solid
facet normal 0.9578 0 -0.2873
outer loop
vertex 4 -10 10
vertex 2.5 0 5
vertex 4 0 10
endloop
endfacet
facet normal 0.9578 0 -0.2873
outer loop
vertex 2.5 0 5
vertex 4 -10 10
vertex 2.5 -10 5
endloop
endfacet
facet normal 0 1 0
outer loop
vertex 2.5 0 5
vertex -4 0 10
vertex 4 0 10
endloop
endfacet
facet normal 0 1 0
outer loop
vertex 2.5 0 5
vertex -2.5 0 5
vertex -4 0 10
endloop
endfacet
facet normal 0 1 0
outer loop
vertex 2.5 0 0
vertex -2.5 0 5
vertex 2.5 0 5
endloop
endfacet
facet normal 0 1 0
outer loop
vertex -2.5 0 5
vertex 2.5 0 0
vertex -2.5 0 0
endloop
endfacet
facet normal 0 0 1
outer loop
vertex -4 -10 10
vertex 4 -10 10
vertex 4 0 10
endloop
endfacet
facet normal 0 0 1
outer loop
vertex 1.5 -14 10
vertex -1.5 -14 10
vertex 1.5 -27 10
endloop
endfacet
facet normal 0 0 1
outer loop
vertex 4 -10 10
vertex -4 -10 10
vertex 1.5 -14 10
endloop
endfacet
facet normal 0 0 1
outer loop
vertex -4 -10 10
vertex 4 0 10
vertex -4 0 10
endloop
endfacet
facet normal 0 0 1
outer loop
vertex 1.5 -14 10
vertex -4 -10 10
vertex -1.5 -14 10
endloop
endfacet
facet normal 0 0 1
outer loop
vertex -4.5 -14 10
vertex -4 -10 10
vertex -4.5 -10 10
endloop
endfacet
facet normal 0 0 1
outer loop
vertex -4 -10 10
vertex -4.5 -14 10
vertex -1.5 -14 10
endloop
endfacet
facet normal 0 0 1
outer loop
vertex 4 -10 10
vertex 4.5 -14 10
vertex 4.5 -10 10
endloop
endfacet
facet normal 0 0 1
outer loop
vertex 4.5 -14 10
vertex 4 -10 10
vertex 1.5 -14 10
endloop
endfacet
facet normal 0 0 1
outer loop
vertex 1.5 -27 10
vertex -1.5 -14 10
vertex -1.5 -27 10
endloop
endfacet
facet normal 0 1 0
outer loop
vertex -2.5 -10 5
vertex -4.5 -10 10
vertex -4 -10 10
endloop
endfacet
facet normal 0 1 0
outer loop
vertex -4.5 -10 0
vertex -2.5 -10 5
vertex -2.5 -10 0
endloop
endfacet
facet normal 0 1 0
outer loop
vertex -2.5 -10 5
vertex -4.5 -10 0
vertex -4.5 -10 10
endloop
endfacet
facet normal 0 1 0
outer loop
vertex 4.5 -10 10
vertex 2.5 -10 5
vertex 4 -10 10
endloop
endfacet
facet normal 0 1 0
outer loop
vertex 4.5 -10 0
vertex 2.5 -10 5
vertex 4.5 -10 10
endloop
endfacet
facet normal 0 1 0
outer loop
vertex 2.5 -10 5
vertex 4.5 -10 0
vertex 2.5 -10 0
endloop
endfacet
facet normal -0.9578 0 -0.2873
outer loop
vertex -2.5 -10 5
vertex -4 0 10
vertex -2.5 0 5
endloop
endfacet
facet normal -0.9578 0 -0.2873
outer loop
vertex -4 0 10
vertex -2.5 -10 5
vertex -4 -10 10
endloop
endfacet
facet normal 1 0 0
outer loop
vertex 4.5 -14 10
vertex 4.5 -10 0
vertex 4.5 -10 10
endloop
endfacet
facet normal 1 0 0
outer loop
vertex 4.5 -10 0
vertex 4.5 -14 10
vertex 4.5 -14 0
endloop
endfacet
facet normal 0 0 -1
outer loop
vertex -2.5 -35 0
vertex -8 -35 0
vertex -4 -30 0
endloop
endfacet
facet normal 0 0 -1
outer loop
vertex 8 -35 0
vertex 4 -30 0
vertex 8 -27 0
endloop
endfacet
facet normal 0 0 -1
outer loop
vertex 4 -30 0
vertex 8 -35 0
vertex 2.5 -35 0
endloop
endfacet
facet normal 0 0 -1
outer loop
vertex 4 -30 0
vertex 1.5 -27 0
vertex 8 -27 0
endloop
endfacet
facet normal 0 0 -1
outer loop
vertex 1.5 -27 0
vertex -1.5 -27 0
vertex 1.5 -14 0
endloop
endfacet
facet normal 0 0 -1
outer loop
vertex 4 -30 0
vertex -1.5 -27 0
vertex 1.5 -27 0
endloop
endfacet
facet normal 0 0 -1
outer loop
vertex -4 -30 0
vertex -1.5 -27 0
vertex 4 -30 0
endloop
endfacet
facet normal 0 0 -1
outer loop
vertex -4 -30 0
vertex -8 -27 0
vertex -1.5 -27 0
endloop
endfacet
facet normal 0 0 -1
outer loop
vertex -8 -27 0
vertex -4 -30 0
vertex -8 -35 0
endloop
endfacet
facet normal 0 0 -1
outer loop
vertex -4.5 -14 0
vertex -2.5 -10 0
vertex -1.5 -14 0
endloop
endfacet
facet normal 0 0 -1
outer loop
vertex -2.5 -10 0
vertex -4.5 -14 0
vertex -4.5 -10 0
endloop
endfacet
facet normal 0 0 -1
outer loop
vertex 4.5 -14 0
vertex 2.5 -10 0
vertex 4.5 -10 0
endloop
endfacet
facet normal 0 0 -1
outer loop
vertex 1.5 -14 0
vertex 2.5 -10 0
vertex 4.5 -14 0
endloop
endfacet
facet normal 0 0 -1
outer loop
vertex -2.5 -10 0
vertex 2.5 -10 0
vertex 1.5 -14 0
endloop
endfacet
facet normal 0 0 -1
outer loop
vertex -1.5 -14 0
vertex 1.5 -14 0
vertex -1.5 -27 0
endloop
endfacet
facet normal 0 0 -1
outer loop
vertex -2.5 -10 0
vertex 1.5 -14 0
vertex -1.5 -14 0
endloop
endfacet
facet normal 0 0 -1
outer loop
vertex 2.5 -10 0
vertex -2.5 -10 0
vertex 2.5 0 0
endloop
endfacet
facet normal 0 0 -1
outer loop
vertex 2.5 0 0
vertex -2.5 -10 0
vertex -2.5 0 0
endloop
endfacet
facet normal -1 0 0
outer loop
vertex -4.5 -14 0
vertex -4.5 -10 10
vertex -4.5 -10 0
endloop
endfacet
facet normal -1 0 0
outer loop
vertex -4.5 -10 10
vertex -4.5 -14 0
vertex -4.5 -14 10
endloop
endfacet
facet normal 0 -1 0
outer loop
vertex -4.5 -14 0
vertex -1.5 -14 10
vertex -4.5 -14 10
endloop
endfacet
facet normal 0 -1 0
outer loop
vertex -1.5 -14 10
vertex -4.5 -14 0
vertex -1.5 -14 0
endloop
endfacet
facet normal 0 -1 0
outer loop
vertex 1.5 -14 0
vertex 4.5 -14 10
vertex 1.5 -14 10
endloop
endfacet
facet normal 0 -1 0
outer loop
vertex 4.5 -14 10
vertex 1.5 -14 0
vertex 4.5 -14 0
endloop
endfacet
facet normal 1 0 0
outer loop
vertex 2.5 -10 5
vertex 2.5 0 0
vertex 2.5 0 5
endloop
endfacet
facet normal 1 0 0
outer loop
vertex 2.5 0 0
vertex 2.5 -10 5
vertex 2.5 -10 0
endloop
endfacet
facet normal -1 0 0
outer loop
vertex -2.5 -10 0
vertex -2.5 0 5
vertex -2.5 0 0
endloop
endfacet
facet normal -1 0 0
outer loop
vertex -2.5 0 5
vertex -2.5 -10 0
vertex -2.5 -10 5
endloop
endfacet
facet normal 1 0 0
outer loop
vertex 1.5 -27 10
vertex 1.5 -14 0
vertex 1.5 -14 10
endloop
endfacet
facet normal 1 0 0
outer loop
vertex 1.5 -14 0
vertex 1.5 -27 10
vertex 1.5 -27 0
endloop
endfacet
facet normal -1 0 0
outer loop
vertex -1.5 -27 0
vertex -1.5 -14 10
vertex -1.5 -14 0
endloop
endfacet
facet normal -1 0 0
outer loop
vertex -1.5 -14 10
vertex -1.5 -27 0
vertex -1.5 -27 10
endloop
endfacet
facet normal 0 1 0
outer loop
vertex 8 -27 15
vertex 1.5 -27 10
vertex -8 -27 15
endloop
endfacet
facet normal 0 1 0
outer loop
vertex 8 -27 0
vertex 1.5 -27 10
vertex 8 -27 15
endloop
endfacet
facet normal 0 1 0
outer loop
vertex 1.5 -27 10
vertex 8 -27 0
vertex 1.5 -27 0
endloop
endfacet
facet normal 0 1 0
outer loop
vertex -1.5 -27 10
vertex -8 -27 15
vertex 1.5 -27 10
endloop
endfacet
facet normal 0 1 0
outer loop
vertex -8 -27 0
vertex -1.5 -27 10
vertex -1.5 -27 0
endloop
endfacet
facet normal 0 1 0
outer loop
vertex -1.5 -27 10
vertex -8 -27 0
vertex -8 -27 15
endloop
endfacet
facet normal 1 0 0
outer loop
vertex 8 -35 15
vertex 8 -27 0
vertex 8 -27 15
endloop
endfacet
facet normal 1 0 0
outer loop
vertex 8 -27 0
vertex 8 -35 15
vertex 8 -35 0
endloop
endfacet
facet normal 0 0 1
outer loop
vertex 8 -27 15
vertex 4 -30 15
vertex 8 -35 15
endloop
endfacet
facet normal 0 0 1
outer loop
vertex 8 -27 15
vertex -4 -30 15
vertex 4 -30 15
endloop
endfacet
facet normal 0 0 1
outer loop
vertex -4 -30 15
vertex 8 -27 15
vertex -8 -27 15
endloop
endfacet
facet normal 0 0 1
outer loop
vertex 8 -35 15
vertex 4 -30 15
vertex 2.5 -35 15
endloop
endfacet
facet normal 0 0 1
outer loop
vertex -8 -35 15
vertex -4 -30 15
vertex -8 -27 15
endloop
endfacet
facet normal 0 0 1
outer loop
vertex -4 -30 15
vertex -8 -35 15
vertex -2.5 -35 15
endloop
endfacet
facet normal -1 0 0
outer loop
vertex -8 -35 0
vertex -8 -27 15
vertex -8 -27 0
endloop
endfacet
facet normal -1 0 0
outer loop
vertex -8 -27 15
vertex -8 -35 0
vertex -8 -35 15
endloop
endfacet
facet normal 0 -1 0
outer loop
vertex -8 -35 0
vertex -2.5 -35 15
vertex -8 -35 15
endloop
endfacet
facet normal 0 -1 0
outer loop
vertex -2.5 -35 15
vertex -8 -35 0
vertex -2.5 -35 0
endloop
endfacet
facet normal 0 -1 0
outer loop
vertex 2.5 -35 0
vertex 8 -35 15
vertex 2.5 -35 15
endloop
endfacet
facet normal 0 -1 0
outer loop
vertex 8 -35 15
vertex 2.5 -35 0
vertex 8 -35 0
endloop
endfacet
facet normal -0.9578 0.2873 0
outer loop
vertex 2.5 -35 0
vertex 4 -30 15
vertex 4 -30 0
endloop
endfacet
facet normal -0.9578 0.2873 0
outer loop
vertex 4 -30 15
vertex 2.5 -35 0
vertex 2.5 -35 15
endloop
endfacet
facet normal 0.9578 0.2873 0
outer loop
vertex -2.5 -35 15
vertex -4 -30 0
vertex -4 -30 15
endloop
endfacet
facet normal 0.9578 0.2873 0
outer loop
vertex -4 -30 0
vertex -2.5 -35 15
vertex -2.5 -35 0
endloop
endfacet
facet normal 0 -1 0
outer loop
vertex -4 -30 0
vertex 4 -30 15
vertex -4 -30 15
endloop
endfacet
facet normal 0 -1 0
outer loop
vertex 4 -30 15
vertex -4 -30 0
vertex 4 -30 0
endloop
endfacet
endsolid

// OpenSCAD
// file: include.scad
//////////////////      END SECTION       //////////////////

	module added_pins(){
		difference(){
			union(){
				translate([30/(15/4),obj_leg*leg_length,30/(15/4)]) pin();
				translate([30/(15/4)+14.5,obj_leg*leg_length,30/(15/4)+14]) pin();
			}
			union(){
							translate([30/(15/4)+13.5,obj_leg*leg_length-20,30/(15/4)+5])cube(size=[2,40,15]);
							translate([30/(15/4)+7.5,obj_leg*leg_length-20,30/(15/4)+15])rotate([0,90,0]) cube(size=[2,40,15]);	

							translate([30/(15/4)-1,obj_leg*leg_length-20,30/(15/4)-8])cube(size=[2,40,15]);
							translate([30/(15/4)-10,obj_leg*leg_length-20,30/(15/4)+1])rotate([0,90,0]) cube(size=[2,40,15]);
			}
		}
	}
	module taken_pins() {
		translate([30/(15/4)+14,obj_leg*leg_length-10,30/(15/4)]) mirror_pin();
		translate([30/(15/4),obj_leg*leg_length-10,30/(15/4)+15]) mirror_pin();
	}


//////////////////      OTHER STUFF       //////////////////

	module holes() {
		rotate([0,0,90]) for(y=[0:other_holes])
		translate([obj_leg+y*15,-15.5,7.5]) union() {
			translate([7.5,0,15]) hole_up();
			hole_down();
		}
	}
	module extend_holes() {
	module top(){
		rotate([0,0,90]) for(y=[0:other_holes+1])
		translate([(30/4)+y*15,-15.5,7.5]) union() {
			translate([7.5,0,15]) hole_up();
		}
	}
	module bottom(){
		rotate([0,0,90]) for(y=[0:other_holes+2])
		translate([(30/4)+y*15,-15.5,7.5]) union() {
			hole_down();
		
}
	}
	union(){
		top();
		bottom();
	}
	}

	module hole() {
		union() {
			rotate([90, 90, 0]) cylinder(h=40, d=hole_pin_diameter, center=true);
			translate([0,7.5,0]) sphere(d=hole_ball_size);
			translate([0,-6,0]) sphere(d=hole_ball_size);
		}
	}
	module hole_up() {
		union() {
			rotate([90, 90, 0]) cylinder(h=40, d=hole_pin_diameter, center=true);
			translate([0,7.5,10]) cylinder(h=hole_pin_height, d=hole_pin_diameter, center=true);
			translate([0,-6,10]) cylinder(h=hole_pin_height, d=hole_pin_diameter, center=true);
			translate([0,7.5,0]) sphere(d=hole_ball_size);
			translate([0,-6,0]) sphere(d=hole_ball_size);
		}
	}
	module hole_down() {
		union() {
			rotate([90, 90, 0]) cylinder(h=40, d=hole_pin_diameter, center=true);
			translate([0,7.5,-10]) cylinder(h=hole_pin_height, d=hole_pin_diameter, center=true);
			translate([0,-6,-10]) cylinder(h=hole_pin_height, d=hole_pin_diameter, center=true);
			translate([0,7.5,0]) sphere(d=hole_ball_size);
			translate([0,-6,0]) sphere(d=hole_ball_size);
		}
	}
	module pin() {
		union() {
			rotate([90, 90, 0]) cylinder(h=pin_height, d=pin_diameter, center=true);
			translate([0,7.5,0]) sphere(d=ball_size);
		}
	}

	module mirror_pin() {
		rotate([90, 90, 0]) cylinder(h=hole_pin_height+small_number, d=hole_pin_diameter, center=true);
		translate([0,-(pin_height-(ball_size/2)),0]) sphere(d=ball_size);
	}


//////////////////      SOME RACK AND Z THINGS       //////////////////

module z_holes() {
    rotate([0,-90,0]) for(z=[0:z_hole_number])
    translate([22.5+z*15,16,-12])
        hole();
}

module pin_cuts() {
	union(){
		cube(size=[2,10,40], center=true);
		rotate([0,0,90]) cube(size=[2,10,40], center=true);
	}
}
module pin_uncut() {
	union(){
		rotate([0, 0, 90]) cylinder(h=hole_pin_height, d=hole_pin_diameter, center=true);
		translate([0,0,10]) sphere(d=ball_hole);
	}
}


module pin_out() {
	union(){
		rotate([0, 0, 90]) cylinder(h=pin_height, d=pin_diameter, center=true);
		translate([0,0,10]) sphere(d= ball_size);
	}
}


module pins_z(){
	difference() {
		pin_out();
		pin_cuts();
	}
}
//////////////////      RACK AND SLIDE     ///////////////////

module straight_pins() {
	for(z=[0:((((obj_leg*leg_length)*2)-(obj_leg*2))/3)/14.5]) rotate([-90,0,0]) translate([z*15,30/(15/4),14]) pins_z();
	for(z=[0:((((obj_leg*leg_length)*2)-(obj_leg*2))/3)/14.5]) rotate([-90,0,0]) translate([z*15,30/(15/4)-14,14]) pins_z();
}
module stagger_pins() {
	for(z=[0:((((obj_leg*leg_length)*2)-(obj_leg*2))/3)/14.5]) rotate([-90,0,0]) translate([z*15,30/(15/4),14]) pins_z();
	for(z=[0:((((obj_leg*leg_length)*2)-(obj_leg*2))/3)/14.5]) rotate([-90,0,0]) translate([z*15+7,30/(15/4)-14,14]) pins_z();
}


//////////////////      DOVE TAIL       //////////////////

module male_dovetail(height) {
	dovetail_3d(max_width,min_width,depth,height);
}

module dovetail_3d(max_width=11, min_width=5, depth=5, height=30) {
	linear_extrude(height=height, convexity=2)
		dovetail_2d(max_width,min_width,depth);
}

module dovetail_2d(max_width=11, min_width=5, depth=5) {
	angle=atan((max_width/2-min_width/2)/depth);
	echo("angle: ", angle);
	polygon(paths=[[0,1,2,3,0]], points=[[-min_width/2,0], [-max_width/2,depth], [max_width/2, depth], [min_width/2,0]]);
}

//bow tie
	module tie_end(height){
				rotate([0,0,0]) translate([0,-0.01,((obj_leg/2)/2)]) male_dovetail(height);
				rotate([0,90,0]) translate([0,-0.01,((obj_leg/2)/2)]) male_dovetail(height);
				rotate([0,180,0]) translate([0,-0.01,((obj_leg/2)/2)]) male_dovetail(height);
				rotate([0,-90,0]) translate([0,-0.01,((obj_leg/2)/2)]) male_dovetail(height);
	}

module bow_support(){
	difference(){
		intersection(){
			translate([-15,0,-15]) cube([30,9,30]);
			scale([1.05,1.05,1.05]) rotate([0,45,0]) tie_end();
		}
		cube([29.2,29.2,29.2], center=true);
	}
}

	module wrap(units){
	for (y = [-1:units-2]) // two iterations, z = -1, z = 1
	{
			translate([15, (y*30)+15, 15]){
			for (r = [0:4]) // two iterations, z = -1, z = 1
			{
				rotate([0,r*90,0]) translate([0,15,15]) rotate([-90,0,0])male_dovetail(height=30);
			}
		}
	}
	}
// file: globals.scad
/*
Most things in this file is represented as one millimeter, so keep that in mind while changing things.
Some of the setting are not mm but at variables that you can set, such as 2*x=2x and you are setting what x is.
I will try to specify when things are variables and not exact measurements.
*/

obj_leg = 30;
leg_length = 5.5;
small_number = 0.001;
metal_core_rode_global = 5;


///////////////// number of holes /////////////////////
z_hole_number = 8;
other_holes = 8;

///////////////// Pins /////////////////////

//pins that poke out
ball_size = 10;
pin_height = 20;
pin_diameter = 6;


//holes
hole_ball_size = ball_size;
hole_pin_height = pin_height;
hole_pin_diameter = pin_diameter;

///////////////// Z THINGS /////////////////////

berring_slot_width = 7.5;
berring_slot_depth = 6.5;
metal_core_rode = 5;

///////////////// X THINGS /////////////////////

//male dove tails
max_width=8;
min_width=5;
depth=5;
height=obj_leg/2;

//female dove tails, this is found on the y mounts
girl_max_width=11;
girl_min_width=5;
girl_depth=5;
girl_height=obj_leg;


///////////////// Y THINGS /////////////////////
/*
The Y is so normal that all of those global variables at the top should change all of the setting in it, this section is set her incase there are variables set in the future development of this project.
*/
// main file
include <globals.scad>;
include <include.scad>;

height = 27;

difference() {
    union() {
        translate([0,0,5]) rotate([90,0,0]) male_dovetail(height=10);
        translate([-4.5, -14, 0]) cube([9,4,10]);
        translate([-2.5, -12, 0]) cube([5,12,5]);
        translate([-1.5, -height, 0]) cube([3,height,10]);
        translate([-8, -height-8, 0]) cube([16,8,15]);
    }
    translate([0, -height-8, 0]) male_dovetail(height=15);
}
